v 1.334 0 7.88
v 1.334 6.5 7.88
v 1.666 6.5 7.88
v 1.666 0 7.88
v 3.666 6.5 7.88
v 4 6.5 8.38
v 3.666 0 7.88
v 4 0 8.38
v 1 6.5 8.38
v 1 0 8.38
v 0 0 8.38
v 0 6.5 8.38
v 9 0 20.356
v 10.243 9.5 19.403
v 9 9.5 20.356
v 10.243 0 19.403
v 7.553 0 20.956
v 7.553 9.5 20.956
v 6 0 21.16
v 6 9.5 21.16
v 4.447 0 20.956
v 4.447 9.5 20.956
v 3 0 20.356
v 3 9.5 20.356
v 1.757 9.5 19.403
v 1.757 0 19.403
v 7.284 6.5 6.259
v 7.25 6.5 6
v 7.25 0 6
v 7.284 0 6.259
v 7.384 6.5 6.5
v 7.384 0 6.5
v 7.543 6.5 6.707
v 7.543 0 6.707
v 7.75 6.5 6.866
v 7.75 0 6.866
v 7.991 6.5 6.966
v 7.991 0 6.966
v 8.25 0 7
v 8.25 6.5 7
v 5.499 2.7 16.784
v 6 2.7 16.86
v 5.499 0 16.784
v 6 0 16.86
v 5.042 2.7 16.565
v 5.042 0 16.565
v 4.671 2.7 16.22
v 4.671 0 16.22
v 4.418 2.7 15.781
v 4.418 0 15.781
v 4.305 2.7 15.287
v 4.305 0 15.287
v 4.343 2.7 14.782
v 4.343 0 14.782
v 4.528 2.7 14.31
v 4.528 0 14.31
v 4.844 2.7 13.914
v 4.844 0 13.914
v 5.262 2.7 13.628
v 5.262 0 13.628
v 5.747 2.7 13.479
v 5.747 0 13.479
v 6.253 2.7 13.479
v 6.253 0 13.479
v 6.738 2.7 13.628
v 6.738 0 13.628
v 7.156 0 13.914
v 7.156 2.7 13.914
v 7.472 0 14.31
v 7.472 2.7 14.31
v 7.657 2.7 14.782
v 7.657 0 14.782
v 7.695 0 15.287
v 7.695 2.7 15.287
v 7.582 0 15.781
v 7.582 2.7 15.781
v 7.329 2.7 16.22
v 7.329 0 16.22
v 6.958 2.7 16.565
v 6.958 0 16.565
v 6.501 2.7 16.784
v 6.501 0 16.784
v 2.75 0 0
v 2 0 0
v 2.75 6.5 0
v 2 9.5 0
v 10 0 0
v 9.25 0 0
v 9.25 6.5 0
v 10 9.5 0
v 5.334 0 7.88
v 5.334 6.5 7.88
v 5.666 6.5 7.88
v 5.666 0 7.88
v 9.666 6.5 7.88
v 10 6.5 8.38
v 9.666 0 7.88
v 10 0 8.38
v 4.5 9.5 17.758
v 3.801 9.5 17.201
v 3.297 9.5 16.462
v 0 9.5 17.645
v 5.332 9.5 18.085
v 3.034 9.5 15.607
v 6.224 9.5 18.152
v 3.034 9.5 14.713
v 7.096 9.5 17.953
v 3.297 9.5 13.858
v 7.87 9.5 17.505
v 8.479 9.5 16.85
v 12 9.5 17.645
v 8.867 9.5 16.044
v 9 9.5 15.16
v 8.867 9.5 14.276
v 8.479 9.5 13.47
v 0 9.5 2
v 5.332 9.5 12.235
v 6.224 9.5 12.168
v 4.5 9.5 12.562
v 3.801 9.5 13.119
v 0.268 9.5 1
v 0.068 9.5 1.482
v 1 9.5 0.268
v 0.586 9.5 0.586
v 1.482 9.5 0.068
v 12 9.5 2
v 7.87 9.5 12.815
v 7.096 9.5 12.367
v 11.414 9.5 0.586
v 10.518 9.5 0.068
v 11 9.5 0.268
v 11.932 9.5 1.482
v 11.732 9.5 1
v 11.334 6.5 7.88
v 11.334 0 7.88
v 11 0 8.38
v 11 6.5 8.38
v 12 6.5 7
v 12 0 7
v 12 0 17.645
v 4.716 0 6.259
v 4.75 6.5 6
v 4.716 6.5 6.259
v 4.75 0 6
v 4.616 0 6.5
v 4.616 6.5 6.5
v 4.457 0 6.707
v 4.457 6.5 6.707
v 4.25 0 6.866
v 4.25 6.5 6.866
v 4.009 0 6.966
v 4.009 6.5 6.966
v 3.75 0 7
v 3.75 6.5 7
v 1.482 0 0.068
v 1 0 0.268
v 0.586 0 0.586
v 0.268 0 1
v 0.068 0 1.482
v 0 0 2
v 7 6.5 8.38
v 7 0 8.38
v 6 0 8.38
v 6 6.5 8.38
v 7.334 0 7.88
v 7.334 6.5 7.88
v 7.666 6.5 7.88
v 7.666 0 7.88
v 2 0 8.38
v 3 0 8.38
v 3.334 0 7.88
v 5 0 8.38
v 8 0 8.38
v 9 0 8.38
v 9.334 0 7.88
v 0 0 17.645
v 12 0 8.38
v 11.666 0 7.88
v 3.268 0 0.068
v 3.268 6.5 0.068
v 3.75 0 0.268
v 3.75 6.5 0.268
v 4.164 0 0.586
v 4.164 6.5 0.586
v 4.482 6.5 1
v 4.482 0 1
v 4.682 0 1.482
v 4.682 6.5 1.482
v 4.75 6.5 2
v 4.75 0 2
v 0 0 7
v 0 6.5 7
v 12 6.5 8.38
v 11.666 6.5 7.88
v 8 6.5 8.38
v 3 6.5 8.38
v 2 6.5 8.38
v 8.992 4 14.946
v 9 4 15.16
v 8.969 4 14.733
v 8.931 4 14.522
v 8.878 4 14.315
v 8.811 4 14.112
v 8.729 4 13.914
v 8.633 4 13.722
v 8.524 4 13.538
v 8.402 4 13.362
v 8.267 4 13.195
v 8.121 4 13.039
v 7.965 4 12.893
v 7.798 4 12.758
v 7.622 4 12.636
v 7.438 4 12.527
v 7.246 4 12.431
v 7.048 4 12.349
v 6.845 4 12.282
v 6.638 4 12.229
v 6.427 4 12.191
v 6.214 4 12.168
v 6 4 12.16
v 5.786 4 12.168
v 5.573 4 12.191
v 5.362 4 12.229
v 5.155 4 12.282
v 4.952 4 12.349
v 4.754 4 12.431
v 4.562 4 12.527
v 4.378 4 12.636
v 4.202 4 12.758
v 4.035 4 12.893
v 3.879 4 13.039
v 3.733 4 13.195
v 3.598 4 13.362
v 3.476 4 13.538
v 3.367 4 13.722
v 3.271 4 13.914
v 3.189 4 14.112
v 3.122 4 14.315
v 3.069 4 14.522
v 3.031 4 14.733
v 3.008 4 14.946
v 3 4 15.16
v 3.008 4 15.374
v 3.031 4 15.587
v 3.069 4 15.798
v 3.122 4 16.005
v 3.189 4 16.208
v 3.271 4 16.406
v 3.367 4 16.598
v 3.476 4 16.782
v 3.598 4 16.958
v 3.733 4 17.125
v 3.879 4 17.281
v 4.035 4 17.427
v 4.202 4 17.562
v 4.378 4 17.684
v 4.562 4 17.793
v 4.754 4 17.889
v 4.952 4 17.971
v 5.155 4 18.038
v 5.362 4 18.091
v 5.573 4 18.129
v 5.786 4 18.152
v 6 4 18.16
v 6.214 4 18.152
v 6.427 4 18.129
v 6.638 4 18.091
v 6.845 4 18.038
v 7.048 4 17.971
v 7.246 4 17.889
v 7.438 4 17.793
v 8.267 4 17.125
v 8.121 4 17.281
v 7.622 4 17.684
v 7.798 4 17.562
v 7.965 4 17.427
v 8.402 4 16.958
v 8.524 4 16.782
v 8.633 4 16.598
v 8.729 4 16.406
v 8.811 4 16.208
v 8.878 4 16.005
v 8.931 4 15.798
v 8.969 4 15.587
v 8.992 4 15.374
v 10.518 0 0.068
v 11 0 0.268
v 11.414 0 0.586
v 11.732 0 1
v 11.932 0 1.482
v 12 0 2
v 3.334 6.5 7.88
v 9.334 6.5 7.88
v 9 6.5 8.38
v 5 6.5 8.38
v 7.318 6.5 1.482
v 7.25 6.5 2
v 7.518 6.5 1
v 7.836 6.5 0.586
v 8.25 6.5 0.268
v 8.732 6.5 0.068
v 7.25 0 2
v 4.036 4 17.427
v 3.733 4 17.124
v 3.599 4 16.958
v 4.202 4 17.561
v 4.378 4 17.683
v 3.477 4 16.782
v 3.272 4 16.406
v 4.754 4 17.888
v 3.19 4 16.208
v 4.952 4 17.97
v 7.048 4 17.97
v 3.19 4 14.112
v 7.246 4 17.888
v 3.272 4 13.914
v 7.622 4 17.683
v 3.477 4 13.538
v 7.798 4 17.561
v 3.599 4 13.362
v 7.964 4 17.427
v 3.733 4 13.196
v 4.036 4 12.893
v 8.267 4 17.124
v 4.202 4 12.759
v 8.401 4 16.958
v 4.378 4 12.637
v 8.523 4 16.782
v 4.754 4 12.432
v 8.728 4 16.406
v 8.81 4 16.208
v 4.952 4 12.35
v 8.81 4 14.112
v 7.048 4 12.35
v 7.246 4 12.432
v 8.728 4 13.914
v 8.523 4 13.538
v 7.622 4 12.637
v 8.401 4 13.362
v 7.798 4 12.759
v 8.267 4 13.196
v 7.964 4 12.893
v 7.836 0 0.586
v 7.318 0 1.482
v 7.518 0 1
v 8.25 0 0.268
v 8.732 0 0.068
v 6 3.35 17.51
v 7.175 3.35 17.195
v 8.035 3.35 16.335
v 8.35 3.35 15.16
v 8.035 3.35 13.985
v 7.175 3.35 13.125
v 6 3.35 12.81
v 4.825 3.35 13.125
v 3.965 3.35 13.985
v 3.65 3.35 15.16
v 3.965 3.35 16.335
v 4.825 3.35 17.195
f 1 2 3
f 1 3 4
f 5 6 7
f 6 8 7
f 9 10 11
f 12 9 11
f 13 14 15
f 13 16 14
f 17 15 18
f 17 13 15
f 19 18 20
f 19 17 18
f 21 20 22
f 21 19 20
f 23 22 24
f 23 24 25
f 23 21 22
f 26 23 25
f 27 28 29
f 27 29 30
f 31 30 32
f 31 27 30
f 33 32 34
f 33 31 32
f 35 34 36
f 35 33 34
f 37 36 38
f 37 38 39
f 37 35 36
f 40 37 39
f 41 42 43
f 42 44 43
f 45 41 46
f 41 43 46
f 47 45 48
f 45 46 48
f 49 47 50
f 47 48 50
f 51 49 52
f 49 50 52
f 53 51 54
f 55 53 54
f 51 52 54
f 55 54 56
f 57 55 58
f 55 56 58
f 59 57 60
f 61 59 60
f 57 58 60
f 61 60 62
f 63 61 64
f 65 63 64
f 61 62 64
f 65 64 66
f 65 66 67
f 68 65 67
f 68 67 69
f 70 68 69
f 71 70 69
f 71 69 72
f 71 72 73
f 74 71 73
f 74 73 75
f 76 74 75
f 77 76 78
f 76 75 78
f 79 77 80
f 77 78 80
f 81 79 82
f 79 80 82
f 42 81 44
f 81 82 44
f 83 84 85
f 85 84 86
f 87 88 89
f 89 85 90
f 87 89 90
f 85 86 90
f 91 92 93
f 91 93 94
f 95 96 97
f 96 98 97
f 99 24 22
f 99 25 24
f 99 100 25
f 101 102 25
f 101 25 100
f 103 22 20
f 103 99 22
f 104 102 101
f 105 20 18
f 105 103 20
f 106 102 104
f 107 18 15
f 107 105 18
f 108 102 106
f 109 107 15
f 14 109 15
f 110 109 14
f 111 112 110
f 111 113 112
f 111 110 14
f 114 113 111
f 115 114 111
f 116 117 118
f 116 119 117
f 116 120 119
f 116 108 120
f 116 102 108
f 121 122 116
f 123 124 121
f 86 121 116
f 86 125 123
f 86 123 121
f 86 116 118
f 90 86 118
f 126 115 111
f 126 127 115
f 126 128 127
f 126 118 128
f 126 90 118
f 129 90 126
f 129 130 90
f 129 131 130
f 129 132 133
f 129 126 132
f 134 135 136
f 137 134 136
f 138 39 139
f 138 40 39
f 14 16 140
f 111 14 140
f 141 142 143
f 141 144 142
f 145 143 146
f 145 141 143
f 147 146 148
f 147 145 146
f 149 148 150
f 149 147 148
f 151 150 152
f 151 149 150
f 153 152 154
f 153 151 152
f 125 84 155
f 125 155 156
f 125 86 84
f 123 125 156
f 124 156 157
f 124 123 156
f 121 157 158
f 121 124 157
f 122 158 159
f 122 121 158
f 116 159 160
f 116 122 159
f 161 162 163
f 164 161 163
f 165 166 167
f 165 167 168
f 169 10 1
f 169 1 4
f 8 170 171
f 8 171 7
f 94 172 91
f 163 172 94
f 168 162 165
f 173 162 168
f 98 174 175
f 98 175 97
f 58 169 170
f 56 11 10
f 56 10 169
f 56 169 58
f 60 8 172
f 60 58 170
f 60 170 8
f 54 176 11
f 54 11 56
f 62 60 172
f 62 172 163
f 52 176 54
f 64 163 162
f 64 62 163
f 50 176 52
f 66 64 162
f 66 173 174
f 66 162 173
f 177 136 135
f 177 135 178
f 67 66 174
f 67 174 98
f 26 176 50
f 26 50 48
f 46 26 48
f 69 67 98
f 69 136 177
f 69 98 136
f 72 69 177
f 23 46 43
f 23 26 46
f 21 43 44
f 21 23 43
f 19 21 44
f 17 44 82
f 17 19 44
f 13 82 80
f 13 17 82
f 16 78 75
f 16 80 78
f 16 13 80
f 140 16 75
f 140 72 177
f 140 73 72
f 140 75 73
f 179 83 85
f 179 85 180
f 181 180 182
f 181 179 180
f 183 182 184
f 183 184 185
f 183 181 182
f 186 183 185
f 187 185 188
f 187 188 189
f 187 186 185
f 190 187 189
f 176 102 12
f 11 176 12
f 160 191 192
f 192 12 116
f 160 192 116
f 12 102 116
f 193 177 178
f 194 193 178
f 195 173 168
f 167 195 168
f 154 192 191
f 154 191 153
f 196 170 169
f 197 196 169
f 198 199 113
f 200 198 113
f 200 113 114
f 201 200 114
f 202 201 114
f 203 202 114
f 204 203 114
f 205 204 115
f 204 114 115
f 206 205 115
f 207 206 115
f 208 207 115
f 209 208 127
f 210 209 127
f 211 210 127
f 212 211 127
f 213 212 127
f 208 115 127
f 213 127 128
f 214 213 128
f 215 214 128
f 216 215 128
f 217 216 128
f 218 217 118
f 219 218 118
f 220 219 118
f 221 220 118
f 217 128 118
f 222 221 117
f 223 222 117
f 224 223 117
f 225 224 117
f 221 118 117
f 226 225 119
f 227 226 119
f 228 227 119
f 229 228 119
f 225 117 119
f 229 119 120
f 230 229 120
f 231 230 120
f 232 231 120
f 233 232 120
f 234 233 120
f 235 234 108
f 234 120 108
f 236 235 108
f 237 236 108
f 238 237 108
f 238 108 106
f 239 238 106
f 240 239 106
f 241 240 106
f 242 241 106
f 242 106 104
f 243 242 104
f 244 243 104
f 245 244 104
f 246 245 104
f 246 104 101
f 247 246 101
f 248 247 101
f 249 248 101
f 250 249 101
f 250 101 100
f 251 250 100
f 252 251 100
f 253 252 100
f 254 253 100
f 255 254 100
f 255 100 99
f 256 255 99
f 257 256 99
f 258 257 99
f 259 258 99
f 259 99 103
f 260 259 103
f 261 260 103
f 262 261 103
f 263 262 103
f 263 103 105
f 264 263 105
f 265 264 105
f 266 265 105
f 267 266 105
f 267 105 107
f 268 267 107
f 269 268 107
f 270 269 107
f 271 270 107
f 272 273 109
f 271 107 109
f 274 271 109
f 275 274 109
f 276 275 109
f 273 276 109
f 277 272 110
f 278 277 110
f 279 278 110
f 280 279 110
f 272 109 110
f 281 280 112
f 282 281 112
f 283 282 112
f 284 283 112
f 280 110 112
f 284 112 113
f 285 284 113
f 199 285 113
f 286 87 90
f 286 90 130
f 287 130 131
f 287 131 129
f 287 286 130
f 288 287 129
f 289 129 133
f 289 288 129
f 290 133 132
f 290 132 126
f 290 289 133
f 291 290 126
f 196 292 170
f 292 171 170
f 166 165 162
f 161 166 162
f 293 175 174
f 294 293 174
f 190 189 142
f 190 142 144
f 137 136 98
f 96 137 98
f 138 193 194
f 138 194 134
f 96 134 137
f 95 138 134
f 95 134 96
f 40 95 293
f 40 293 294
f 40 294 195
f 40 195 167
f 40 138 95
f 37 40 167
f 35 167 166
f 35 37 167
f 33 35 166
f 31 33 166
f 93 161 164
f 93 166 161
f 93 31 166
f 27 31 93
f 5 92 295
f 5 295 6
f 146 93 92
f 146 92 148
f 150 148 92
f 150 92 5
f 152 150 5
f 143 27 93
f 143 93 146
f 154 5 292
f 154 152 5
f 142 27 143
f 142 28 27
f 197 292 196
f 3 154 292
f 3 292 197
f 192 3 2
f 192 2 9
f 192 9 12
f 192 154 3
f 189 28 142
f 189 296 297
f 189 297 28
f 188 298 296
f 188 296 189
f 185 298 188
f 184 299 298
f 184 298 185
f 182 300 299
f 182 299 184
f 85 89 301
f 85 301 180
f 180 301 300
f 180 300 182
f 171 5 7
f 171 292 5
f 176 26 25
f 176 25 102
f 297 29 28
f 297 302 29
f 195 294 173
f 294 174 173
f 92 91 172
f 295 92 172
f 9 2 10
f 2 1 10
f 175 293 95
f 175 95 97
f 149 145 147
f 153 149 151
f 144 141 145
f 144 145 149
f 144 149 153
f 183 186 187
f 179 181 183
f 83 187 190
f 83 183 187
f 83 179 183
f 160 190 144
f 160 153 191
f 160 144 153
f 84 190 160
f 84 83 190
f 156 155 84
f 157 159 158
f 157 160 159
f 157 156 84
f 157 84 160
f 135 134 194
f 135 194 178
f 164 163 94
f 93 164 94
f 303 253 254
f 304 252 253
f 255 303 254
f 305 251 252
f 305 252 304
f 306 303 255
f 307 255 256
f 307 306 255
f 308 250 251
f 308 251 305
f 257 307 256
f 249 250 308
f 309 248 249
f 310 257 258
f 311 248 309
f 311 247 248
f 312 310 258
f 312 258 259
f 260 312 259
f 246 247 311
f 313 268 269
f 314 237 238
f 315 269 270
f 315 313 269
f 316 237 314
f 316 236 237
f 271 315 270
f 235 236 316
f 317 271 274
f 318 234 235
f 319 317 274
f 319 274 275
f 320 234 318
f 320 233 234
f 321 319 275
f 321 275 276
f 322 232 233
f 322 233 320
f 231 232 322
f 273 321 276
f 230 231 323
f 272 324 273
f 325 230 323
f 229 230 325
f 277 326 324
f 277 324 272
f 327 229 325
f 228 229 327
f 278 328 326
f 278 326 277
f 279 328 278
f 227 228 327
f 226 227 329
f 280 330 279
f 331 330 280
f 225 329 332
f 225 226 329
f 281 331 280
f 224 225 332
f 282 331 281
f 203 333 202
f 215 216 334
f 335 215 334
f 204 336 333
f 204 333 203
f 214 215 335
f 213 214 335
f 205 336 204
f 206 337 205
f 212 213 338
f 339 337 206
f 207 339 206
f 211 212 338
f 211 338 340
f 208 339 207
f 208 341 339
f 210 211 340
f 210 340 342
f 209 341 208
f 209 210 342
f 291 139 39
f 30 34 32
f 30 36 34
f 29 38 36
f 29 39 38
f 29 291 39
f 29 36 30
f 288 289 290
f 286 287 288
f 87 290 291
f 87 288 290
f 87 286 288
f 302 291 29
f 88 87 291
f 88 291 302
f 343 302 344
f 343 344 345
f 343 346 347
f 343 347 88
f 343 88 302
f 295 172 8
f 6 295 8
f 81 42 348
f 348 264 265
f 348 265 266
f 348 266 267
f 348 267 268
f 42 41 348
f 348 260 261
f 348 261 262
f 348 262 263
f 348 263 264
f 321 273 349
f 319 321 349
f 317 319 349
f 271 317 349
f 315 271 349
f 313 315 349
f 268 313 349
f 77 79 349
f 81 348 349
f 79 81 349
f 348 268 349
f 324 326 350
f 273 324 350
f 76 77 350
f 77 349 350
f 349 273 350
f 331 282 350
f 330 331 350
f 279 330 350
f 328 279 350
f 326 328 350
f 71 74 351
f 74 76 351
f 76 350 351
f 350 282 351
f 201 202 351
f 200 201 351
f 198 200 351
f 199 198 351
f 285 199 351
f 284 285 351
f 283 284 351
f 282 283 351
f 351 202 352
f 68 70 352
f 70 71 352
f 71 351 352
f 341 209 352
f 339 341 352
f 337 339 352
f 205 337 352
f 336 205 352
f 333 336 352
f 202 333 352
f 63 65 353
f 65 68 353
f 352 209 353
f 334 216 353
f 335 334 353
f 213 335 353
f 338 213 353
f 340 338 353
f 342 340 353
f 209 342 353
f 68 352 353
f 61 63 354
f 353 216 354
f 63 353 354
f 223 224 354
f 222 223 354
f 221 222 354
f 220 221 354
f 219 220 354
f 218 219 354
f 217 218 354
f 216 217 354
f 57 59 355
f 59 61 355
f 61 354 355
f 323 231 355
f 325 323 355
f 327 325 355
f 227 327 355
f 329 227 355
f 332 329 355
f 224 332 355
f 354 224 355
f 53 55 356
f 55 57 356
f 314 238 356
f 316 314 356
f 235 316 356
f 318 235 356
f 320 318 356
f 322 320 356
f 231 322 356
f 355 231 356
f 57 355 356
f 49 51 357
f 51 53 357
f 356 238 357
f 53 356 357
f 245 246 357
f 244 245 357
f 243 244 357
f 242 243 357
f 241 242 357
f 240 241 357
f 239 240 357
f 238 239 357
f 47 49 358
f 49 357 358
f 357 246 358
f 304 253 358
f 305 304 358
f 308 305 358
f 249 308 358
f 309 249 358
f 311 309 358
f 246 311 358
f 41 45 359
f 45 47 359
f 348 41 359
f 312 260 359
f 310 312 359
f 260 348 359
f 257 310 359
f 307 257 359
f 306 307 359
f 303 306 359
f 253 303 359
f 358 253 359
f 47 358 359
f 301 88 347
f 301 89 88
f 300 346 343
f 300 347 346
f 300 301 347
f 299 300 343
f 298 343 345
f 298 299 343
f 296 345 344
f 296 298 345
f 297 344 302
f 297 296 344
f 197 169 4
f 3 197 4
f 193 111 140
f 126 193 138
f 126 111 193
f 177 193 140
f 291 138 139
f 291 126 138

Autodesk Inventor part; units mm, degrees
ref_plane "YZ Plane" through (0, 0, 0) normal (1, 0, 0) x (0, 1, 0)
ref_plane "XZ Plane" through (0, 0, 0) normal (0, 1, 0) x (-1, 0, 0)
ref_plane "XY Plane" through (0, 0, 0) normal (0, 0, 1) x (1, 0, 0)
sketch "Sketch1" plane through (0, 0, 0) normal (0, 0, 1) x (1, 0, 0)
  line L0 (0, 0) -> (0, 9.5)
  line L1 (0, 9.5) -> (12, 9.5)
  line L2 (12, 9.5) -> (12, 0)
  line L3 (12, 0) -> (7.25, 0)
  line L4 (7.25, 0) -> (7.25, 6.5)
  line L5 (7.25, 6.5) -> (4.75, 6.5)
  line L6 (4.75, 6.5) -> (4.75, 0)
  line L7 (4.75, 0) -> (0, 0)
  line L8 (6, 6.5) -> (6, 0.5) construction
  dimension "d17" = 6.5
  dimension "d18" = 12
  dimension "d20" = 2.5
  dimension "d21" = 3
extrude "Extrusion1" add sketch "Sketch1" along normal blind 7
sketch "Sketch3" plane through (7.25, 0, 0) normal (0, -1, 0) x (1, 0, 0)
  line L0 (-2.5, 0) -> (0, 0) projected
  line L1 (0, 0) -> (0, 7) projected
  line L2 (-2.5, 7) -> (0, 7) projected
  line L3 (-2.5, 0) -> (-2.5, 7) projected
  line L4 (0, 0) -> (4.75, 0) projected
  line L5 (4.75, 0) -> (4.75, 7) projected
  line L6 (0, 7) -> (4.75, 7) projected
  line L7 (0, 0) -> (0, 7) projected
  line L8 (-7.25, 0) -> (-2.5, 0) projected
  line L9 (-2.5, 0) -> (-2.5, 7) projected
  line L10 (-7.25, 7) -> (-2.5, 7) projected
  line L11 (-7.25, 0) -> (-7.25, 7) projected
  line L12 (-7.25, 21.16) -> (4.75, 21.16)
  line L13 (4.75, 21.16) -> (4.75, 8.38)
  line L14 (4.75, 8.38) -> (-7.25, 8.38)
  line L15 (-7.25, 8.38) -> (-7.25, 21.16)
  line L16 (4.75, 8.38) -> (4.25, 7.63)
  line L17 (4.25, 7.63) -> (3.75, 8.38)
  line L18 (4.75, 0) -> (4.75, 7) projected
  line L19 (-7.25, 0) -> (-7.25, 7) projected
  line L20 (-1.25, 8.38) -> (-1.25, 21.16) construction
  line L21 (2.75, 8.38) -> (2.25, 7.63)
  line L22 (2.25, 7.63) -> (1.75, 8.38)
  line L23 (0.75, 8.38) -> (0.25, 7.63)
  line L24 (0.25, 7.63) -> (-0.25, 8.38)
  line L25 (-1.25, 8.38) -> (-1.75, 7.63)
  line L26 (-1.75, 7.63) -> (-2.25, 8.38)
  line L27 (-3.25, 8.38) -> (-3.75, 7.63)
  line L28 (-3.75, 7.63) -> (-4.25, 8.38)
  line L29 (-5.25, 8.38) -> (-5.75, 7.63)
  line L30 (-5.75, 7.63) -> (-6.25, 8.38)
  circle A0 centre (-1.25, 15.16) radius 6
  line L31 (-5.4926, 19.4026) -> (-7.25, 17.6453)
  line L32 (2.9926, 19.4026) -> (4.75, 17.6453)
  point P0 (-6.25, 8.38)
  point P1 (-5.25, 8.38)
  point P2 (-4.25, 8.38)
  point P3 (-3.25, 8.38)
  point P4 (-2.25, 8.38)
  point P5 (-1.25, 8.38)
  point P6 (-0.25, 8.38)
  point P7 (0.75, 8.38)
  point P8 (1.75, 8.38)
  dimension "d22" = 1.38
  dimension "d23" = 12.78
  dimension "d24" = 0.75
  dimension "d25" = 1
  dimension "d28" = 2
  dimension "d42" = 12
  dimension "d43" = 135
  dimension "d44" = 135
extrude "Extrusion2" add sketch "Sketch3" against normal up to surface (9.5 mm away) contours A0 | L31 A0 L15 | L32 L13 A0 | A0 L13 L14 L15 | L16 L17 L14 | L14 L29 L30 | L21 L22 L14 | L14 L27 L28 | L23 L24 L14 | L14 L25 L26
fillet "Fillet2" radius 1 2 edges at (4.75, 3.25, 7) (7.25, 3.25, 7)
fillet "Fillet3" radius 2 4 edges at (12, 4.75, 0) (0, 4.75, 0) (7.25, 3.25, 0) (4.75, 3.25, 0)
chamfer "Chamfer1" distance 0.3 angle 45 6 edges at (11.5, 4.75, 7.63) (9.5, 4.75, 7.63) (7.5, 4.75, 7.63) (5.5, 4.75, 7.63) (3.5, 4.75, 7.63) (1.5, 4.75, 7.63)
sketch "Sketch5" plane through (6, 9.5, 15.16) normal (0, 1, 0) x (1, 0, 0)
  line L0 (-4.6664, 7.2804) -> (-4.3336, 7.2804) projected
  line L1 (-5, 6.78) -> (-4.6664, 7.2804) projected
  line L2 (-6, 6.78) -> (-5, 6.78) projected
  line L3 (-6, -2.4853) -> (-6, 6.78) projected
  line L4 (-4.2426, -4.2426) -> (-6, -2.4853) projected
  arc A0 (-4.2426, -4.2426) -> (4.2426, -4.2426) centre (0, 0) ccw projected
  line L5 (6, -2.4853) -> (4.2426, -4.2426) projected
  line L6 (6, 6.78) -> (6, -2.4853) projected
  line L7 (5.6664, 7.2804) -> (6, 6.78) projected
  line L8 (5.3336, 7.2804) -> (5.6664, 7.2804) projected
  line L9 (5, 6.78) -> (5.3336, 7.2804) projected
  line L10 (4, 6.78) -> (5, 6.78) projected
  line L11 (3.6664, 7.2804) -> (4, 6.78) projected
  line L12 (3.3336, 7.2804) -> (3.6664, 7.2804) projected
  line L13 (3, 6.78) -> (3.3336, 7.2804) projected
  line L14 (2, 6.78) -> (3, 6.78) projected
  line L15 (1.6664, 7.2804) -> (2, 6.78) projected
  line L16 (1.3336, 7.2804) -> (1.6664, 7.2804) projected
  line L17 (1, 6.78) -> (1.3336, 7.2804) projected
  line L18 (0, 6.78) -> (1, 6.78) projected
  line L19 (-0.3336, 7.2804) -> (0, 6.78) projected
  line L20 (-0.6664, 7.2804) -> (-0.3336, 7.2804) projected
  line L21 (-1, 6.78) -> (-0.6664, 7.2804) projected
  line L22 (-2, 6.78) -> (-1, 6.78) projected
  line L23 (-2.3336, 7.2804) -> (-2, 6.78) projected
  line L24 (-2.6664, 7.2804) -> (-2.3336, 7.2804) projected
  line L25 (-3, 6.78) -> (-2.6664, 7.2804) projected
  line L26 (-4, 6.78) -> (-3, 6.78) projected
  line L27 (-4.3336, 7.2804) -> (-4, 6.78) projected
  arc A1 (-4, 15.16) -> (-6, 13.16) centre (-4, 13.16) ccw projected
  line L28 (-6, 13.16) -> (-6, 8.16) projected
  line L29 (6, 8.16) -> (-6, 8.16) projected
  line L30 (6, 13.16) -> (6, 8.16) projected
  arc A2 (6, 13.16) -> (4, 15.16) centre (4, 13.16) ccw projected
  line L31 (4, 15.16) -> (-4, 15.16) projected
  line L32 (-6, -2.4853) -> (-6, 6.78) projected
  line L33 (-6, 6.78) -> (-6, 11.1694)
  line L34 (6, 6.78) -> (6, 8.16)
  point P0 (-6, 15.16)
extrude "Extrusion4" add sketch "Sketch5" against normal up to surface (3 mm away)
sketch "Sketch7" plane through (6, 9.5, 15.16) normal (0, 1, 0) x (1, 0, 0)
  circle A0 centre (0, 0) radius 3
  arc A1 (-4.2426, -4.2426) -> (4.2426, -4.2426) centre (0, 0) ccw projected
  point P0 (-6, 15.16)
  dimension "d48" = 6
extrude "Extrusion5" cut sketch "Sketch7" against normal blind 5.5
sketch "Sketch8" plane through (6, 4, 15.16) normal (0, 1, 0) x (1, 0, 0)
  circle A0 centre (0, 0) radius 3 projected
  point P0 (-6, 15.16)
hole "Hole2" at (6, 4, 15.16) direction (0, -1, 0) diameter 3.4 end through all
chamfer "Chamfer2" distance 1.3 angle 45 1 edges at (6, 4, 13.46)
properties part number "Belt Clip"
